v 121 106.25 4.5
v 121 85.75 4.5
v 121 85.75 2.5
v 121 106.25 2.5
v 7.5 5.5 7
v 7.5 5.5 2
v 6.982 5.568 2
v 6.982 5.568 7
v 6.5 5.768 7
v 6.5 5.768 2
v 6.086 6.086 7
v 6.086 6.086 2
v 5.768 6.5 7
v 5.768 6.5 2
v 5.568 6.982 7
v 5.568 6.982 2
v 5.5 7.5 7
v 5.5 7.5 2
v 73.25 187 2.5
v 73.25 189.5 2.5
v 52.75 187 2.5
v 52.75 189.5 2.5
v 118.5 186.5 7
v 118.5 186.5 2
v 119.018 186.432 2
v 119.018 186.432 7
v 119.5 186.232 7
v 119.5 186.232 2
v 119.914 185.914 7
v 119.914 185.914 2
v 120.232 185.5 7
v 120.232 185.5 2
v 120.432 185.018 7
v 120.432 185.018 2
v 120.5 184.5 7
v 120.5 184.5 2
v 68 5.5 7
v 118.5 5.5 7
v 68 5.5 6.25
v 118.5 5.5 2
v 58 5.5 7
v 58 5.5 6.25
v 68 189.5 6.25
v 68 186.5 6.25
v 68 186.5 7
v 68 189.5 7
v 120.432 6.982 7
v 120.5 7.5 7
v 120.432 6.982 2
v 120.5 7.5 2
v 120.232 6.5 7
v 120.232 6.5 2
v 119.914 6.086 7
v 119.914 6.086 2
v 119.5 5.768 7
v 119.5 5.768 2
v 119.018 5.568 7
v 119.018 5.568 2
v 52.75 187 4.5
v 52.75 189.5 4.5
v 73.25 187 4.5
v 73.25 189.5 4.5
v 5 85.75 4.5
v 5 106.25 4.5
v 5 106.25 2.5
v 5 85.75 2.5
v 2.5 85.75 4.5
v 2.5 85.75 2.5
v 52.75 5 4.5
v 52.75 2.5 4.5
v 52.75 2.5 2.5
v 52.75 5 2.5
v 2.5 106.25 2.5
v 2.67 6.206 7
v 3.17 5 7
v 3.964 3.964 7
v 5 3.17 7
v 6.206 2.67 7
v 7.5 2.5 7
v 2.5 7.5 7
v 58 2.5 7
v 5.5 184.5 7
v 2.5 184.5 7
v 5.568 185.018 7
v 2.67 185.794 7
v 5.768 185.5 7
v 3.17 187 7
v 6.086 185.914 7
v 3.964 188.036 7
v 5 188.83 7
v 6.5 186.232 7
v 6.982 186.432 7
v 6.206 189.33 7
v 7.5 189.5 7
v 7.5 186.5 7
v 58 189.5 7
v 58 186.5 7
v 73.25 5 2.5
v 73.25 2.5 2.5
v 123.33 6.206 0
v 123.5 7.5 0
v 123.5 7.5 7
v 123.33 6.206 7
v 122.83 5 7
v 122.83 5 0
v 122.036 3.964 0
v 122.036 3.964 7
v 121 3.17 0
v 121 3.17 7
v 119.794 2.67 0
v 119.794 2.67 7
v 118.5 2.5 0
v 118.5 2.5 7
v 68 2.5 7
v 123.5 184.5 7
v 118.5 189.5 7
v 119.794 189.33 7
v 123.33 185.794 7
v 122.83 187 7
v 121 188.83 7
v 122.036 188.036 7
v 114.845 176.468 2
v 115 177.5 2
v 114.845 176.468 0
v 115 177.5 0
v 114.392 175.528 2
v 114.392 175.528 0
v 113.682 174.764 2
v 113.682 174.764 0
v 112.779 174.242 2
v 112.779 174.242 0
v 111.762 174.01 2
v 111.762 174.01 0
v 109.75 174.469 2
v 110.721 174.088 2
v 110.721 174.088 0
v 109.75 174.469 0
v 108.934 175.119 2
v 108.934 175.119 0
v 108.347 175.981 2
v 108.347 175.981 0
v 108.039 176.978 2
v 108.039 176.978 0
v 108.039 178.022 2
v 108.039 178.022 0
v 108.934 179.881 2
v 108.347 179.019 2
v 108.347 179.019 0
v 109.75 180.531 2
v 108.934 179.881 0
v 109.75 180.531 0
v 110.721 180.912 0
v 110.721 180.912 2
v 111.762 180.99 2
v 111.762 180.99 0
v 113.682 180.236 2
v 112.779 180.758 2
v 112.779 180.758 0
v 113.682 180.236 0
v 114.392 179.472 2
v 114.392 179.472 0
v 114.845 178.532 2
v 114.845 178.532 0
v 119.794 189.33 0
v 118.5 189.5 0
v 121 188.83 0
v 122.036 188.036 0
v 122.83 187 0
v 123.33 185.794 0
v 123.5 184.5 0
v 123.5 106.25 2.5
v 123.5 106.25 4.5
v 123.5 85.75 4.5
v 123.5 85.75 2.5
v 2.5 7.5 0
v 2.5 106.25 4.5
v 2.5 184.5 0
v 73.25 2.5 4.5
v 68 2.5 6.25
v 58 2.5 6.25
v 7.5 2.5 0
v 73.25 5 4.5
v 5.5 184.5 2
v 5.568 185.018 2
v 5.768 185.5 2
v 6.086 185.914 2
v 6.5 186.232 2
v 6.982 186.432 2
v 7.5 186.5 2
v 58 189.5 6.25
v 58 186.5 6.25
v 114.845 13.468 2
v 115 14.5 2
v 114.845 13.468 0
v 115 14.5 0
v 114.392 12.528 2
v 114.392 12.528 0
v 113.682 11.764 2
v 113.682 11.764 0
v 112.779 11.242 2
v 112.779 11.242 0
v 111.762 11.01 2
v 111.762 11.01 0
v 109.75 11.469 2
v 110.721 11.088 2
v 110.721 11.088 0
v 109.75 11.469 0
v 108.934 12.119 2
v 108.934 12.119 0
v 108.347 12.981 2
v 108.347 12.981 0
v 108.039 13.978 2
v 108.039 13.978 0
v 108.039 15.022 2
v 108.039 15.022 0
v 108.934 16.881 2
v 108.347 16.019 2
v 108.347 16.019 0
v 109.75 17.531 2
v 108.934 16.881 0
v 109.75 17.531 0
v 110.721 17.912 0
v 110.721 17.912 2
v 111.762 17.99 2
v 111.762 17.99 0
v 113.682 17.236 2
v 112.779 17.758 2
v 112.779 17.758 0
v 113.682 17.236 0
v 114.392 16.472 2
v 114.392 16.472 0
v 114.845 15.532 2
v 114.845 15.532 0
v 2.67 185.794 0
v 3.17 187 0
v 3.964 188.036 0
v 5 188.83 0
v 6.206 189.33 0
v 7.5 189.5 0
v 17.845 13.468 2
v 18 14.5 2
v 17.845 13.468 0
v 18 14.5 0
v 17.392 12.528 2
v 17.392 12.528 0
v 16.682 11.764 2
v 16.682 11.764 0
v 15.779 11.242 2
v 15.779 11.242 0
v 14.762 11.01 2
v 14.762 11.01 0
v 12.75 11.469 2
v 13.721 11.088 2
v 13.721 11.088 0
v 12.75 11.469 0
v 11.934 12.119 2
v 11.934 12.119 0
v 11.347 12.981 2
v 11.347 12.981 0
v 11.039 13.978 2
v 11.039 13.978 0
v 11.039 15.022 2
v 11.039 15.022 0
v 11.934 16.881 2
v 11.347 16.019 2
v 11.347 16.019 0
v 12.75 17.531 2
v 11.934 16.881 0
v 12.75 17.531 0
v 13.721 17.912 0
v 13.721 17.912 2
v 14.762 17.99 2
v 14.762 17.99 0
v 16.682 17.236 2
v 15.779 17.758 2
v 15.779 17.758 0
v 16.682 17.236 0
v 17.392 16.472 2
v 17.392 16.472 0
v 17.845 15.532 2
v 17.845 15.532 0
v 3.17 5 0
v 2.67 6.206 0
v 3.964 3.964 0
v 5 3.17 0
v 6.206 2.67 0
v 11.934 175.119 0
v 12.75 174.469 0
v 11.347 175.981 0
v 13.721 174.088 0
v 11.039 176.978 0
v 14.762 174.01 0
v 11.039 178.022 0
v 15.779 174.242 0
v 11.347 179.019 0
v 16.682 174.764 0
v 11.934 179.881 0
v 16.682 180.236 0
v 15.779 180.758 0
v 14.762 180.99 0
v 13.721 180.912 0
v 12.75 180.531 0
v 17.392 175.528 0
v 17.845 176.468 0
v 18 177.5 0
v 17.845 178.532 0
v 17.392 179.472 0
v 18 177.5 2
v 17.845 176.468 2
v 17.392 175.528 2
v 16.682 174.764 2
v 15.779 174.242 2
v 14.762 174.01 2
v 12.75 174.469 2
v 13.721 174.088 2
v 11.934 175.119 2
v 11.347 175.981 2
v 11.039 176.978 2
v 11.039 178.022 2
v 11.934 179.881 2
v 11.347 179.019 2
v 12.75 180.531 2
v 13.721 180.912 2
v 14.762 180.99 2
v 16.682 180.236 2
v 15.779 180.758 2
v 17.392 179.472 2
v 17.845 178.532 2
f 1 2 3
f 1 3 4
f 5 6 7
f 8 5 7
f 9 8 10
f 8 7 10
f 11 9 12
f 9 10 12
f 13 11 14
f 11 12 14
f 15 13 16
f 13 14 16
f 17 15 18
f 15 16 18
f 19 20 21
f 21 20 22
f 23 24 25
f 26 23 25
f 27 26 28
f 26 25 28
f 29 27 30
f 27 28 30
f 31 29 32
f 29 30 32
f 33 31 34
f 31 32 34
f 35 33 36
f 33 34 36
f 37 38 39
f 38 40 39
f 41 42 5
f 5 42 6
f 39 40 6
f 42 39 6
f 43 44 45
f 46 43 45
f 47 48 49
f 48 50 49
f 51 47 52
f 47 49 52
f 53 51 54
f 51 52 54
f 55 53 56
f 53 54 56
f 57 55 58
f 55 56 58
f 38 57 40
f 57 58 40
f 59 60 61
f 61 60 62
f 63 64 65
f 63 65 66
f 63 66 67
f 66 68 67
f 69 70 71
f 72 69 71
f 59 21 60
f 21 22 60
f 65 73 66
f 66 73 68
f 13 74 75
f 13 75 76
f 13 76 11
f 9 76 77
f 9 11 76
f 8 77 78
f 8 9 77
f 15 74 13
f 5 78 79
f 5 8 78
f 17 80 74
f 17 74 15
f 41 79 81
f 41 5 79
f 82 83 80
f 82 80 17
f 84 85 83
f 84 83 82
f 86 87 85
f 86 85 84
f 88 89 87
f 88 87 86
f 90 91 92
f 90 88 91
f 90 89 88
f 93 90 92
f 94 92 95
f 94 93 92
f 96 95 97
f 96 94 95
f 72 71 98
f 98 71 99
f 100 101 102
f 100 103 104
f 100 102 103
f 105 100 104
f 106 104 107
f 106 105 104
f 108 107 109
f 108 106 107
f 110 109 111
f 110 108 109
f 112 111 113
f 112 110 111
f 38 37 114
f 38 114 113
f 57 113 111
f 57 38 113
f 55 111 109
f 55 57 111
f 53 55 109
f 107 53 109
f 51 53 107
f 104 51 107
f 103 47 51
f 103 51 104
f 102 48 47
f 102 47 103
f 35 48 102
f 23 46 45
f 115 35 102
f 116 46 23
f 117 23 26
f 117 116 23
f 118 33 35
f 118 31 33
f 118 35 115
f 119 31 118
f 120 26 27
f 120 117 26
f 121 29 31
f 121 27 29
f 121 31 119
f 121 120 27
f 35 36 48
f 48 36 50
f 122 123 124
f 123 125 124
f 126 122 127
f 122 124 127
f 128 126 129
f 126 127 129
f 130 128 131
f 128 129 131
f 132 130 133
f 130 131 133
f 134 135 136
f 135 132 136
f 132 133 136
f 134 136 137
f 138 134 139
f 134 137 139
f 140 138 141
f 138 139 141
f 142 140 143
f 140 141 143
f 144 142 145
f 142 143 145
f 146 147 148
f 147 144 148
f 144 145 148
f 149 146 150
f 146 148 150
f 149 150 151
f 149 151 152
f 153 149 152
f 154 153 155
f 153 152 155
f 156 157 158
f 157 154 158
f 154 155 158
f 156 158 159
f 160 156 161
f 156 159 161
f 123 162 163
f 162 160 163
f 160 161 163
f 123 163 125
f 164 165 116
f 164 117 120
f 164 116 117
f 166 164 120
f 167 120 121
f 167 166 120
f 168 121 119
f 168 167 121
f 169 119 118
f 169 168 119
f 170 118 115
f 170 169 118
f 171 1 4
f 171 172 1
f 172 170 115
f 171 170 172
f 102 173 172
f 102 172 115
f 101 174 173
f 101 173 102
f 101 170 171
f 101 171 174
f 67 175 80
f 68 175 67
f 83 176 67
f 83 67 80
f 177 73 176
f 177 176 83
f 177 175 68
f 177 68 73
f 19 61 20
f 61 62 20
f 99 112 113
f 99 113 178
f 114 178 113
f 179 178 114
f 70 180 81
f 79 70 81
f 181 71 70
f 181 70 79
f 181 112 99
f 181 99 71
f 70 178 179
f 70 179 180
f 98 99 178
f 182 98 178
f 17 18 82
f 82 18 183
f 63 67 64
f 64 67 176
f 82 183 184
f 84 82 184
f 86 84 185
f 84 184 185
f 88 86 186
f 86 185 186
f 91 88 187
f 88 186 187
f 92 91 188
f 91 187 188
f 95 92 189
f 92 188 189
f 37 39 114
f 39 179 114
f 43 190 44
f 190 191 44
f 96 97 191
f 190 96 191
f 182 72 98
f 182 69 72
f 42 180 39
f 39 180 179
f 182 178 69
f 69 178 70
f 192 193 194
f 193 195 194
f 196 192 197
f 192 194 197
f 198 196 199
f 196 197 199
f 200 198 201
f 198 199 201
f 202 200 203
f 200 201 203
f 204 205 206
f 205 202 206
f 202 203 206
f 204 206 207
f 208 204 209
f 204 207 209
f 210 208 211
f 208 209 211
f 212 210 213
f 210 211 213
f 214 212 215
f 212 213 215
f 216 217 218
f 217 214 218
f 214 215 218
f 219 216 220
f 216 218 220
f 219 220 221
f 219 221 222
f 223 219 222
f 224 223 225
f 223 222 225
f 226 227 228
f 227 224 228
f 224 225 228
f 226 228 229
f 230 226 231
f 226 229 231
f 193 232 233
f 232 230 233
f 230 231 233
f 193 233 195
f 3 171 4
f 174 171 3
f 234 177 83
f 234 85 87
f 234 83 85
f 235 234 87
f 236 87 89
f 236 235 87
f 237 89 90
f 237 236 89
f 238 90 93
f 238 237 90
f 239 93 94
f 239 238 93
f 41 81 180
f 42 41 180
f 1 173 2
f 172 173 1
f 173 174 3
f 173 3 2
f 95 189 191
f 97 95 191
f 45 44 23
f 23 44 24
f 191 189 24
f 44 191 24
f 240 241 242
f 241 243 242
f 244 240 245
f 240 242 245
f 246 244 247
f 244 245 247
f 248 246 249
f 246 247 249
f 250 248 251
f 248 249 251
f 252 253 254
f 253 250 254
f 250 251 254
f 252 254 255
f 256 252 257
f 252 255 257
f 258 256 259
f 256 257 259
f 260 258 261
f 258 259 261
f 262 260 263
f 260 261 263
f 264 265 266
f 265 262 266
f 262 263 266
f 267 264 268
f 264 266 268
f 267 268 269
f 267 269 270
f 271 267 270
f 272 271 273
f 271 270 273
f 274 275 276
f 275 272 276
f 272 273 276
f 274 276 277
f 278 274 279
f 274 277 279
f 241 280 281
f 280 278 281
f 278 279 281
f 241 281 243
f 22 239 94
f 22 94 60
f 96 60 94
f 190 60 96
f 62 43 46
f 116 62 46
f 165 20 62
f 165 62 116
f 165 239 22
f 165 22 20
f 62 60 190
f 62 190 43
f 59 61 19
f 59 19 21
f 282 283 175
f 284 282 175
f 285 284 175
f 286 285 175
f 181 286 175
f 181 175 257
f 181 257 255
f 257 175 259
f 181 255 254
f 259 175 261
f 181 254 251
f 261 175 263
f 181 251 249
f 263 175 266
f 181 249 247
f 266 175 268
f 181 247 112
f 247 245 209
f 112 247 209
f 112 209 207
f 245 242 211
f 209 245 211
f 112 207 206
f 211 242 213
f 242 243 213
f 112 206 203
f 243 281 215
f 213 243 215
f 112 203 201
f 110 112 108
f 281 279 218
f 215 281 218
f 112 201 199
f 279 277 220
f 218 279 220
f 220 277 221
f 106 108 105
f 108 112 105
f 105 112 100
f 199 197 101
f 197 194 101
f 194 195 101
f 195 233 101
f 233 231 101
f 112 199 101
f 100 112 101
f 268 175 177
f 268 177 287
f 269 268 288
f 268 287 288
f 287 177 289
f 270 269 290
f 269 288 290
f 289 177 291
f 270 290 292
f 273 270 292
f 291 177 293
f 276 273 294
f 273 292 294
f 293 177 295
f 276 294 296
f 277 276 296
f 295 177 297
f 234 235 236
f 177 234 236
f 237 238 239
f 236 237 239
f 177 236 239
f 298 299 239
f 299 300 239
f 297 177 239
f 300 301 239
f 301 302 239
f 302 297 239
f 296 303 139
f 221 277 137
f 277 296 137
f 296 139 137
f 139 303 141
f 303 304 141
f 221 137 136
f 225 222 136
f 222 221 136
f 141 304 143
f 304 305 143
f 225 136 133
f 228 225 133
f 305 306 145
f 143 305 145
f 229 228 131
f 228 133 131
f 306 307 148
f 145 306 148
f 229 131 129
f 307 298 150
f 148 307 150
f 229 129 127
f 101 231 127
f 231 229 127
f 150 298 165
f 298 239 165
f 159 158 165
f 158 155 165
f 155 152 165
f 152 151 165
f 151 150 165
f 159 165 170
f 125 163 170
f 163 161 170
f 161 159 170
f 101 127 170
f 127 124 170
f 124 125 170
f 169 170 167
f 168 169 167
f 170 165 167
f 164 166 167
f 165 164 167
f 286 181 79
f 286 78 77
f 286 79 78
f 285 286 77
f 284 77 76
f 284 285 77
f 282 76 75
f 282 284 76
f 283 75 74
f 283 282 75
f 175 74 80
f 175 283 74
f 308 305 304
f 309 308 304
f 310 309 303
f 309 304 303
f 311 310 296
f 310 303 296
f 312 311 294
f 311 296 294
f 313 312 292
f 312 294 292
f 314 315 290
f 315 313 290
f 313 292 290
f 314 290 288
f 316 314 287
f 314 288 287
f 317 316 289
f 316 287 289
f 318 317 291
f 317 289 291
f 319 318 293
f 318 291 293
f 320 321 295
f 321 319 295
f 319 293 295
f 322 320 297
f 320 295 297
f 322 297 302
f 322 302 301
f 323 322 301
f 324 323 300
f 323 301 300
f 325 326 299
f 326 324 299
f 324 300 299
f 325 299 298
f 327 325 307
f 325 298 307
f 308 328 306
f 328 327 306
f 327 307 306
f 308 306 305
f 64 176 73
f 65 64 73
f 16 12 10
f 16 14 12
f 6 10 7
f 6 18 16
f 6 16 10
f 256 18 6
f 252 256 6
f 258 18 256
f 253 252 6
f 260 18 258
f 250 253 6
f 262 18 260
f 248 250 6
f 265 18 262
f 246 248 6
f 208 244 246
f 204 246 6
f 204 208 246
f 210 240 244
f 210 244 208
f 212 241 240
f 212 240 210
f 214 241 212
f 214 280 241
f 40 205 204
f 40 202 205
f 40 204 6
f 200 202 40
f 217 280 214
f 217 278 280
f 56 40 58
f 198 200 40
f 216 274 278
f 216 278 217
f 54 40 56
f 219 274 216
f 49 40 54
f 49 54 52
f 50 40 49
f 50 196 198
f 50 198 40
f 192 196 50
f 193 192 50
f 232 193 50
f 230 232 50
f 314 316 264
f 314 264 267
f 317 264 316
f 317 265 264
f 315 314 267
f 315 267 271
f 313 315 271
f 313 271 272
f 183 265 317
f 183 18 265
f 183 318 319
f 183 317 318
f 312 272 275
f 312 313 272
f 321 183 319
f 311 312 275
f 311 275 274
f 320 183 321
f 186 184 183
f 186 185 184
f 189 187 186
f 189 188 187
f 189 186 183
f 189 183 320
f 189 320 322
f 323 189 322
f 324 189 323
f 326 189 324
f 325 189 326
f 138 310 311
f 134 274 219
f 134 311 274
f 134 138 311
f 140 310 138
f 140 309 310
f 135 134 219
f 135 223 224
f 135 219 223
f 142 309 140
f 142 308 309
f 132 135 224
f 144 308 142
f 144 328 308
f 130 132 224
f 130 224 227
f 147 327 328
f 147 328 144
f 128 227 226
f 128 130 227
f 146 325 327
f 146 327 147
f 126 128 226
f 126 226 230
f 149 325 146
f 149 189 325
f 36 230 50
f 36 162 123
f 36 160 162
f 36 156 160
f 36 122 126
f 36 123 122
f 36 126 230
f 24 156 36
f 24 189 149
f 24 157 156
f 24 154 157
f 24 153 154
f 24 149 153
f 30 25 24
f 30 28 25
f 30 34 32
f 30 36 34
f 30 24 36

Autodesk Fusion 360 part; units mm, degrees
sketch "Sketch1" plane through (0, 0, 0) normal (0, 0, 1) x (1, 0, 0)
  circle A0 centre (14.5, 177.5) radius 3.5
  line L0 (7.5, 189.5) -> (118.5, 189.5)
  line L1 (123.5, 184.5) -> (123.5, 7.5)
  line L2 (118.5, 2.5) -> (7.5, 2.5)
  line L3 (2.5, 7.5) -> (2.5, 184.5)
  arc A1 (7.5, 189.5) -> (2.5, 184.5) centre (7.5, 184.5) ccw
  arc A2 (123.5, 184.5) -> (118.5, 189.5) centre (118.5, 184.5) ccw
  arc A3 (2.5, 7.5) -> (7.5, 2.5) centre (7.5, 7.5) ccw
  arc A4 (118.5, 2.5) -> (123.5, 7.5) centre (118.5, 7.5) ccw
  arc A5 (118.5, 5.5) -> (120.5, 7.5) centre (118.5, 7.5) ccw
  line L4 (120.5, 184.5) -> (120.5, 7.5)
  arc A6 (120.5, 184.5) -> (118.5, 186.5) centre (118.5, 184.5) ccw
  line L5 (7.5, 186.5) -> (118.5, 186.5)
  arc A7 (7.5, 186.5) -> (5.5, 184.5) centre (7.5, 184.5) ccw
  line L6 (5.5, 7.5) -> (5.5, 184.5)
  arc A8 (5.5, 7.5) -> (7.5, 5.5) centre (7.5, 7.5) ccw
  line L7 (118.5, 5.5) -> (7.5, 5.5)
  line L8 (63, 186.5) -> (63, 5.5)
  line L9 (5.5, 96) -> (120.5, 96)
  circle A9 centre (111.5, 177.5) radius 3.5
  circle A10 centre (14.5, 14.5) radius 3.5
  circle A11 centre (111.5, 14.5) radius 3.5
  dimension "d5" = 7
  dimension "d28" = 5
  dimension "d30" = 5
  dimension "d32" = 5
  dimension "d34" = 5
  dimension "d36" = 3
  dimension "d37" = 187
  dimension "d38" = 121
  dimension "d41" = 9
  dimension "d42" = 9
extrude "Extrude5" add sketch "Sketch1" along normal blind 2 contours L0 L1 L2 L3 A1 A2 A3 A4 | A5 L4 L7 L8 L9 | L6 A8 L7 L8 L9 | L4 A6 L5 L8 L9 | L5 A7 L6 L8 L9
extrude "Extrude6" add sketch "Sketch1" along normal blind 7 contours L0 L1 L2 L3 A1 A2 A3 A4
sketch "Skizze3" plane through (2.5, 0, 0) normal (-1, 0, 0) x (0, -1, 0)
  line L0 (-184.5, 0) -> (-7.5, 0)
  line L1 (-7.5, 0) -> (-7.5, 7)
  line L2 (-7.5, 7) -> (-184.5, 7)
  line L3 (-184.5, 7) -> (-184.5, 0)
  line L4 (-184.5, 7) -> (-7.5, 0)
  line L5 (-7.5, 7) -> (-184.5, 0)
  line L6 (-85.75, 4.5) -> (-106.25, 4.5)
  line L7 (-106.25, 4.5) -> (-106.25, 2.5)
  line L8 (-106.25, 2.5) -> (-85.75, 2.5)
  line L9 (-85.75, 2.5) -> (-85.75, 4.5)
  line L10 (-85.75, 4.5) -> (-106.25, 2.5) construction
  line L11 (-106.25, 4.5) -> (-85.75, 2.5) construction
  point P0 (-96, 3.5)
  dimension "d43" = 20.5
  dimension "d44" = 2
extrude "Extrusion7" cut sketch "Skizze3" against normal blind 2.5 contours L4 L5 L7 | L4 L5 L7 L8 L9 | L4 L5 L9 | L4 L5 L6 L7 L9
sketch "Skizze4" plane through (0, 189.5, 0) normal (0, 1, 0) x (-1, 0, 0)
  line L0 (-118.5, 0) -> (-7.5, 0)
  line L1 (-7.5, 0) -> (-7.5, 7)
  line L2 (-7.5, 7) -> (-118.5, 7)
  line L3 (-118.5, 7) -> (-118.5, 0)
  line L4 (-118.5, 7) -> (-7.5, 0)
  line L5 (-7.5, 7) -> (-118.5, 0)
  line L6 (-52.75, 4.5) -> (-73.25, 4.5)
  line L7 (-73.25, 4.5) -> (-73.25, 2.5)
  line L8 (-73.25, 2.5) -> (-52.75, 2.5)
  line L9 (-52.75, 2.5) -> (-52.75, 4.5)
  line L10 (-52.75, 4.5) -> (-73.25, 2.5) construction
  line L11 (-73.25, 4.5) -> (-52.75, 2.5) construction
  point P0 (-63, 3.5)
  dimension "d47" = 20.5
  dimension "d48" = 2
extrude "Extrusion8" cut sketch "Skizze4" against normal blind 2.5 contours L4 L5 L7 | L4 L5 L7 L8 L9 | L4 L5 L9 | L4 L5 L6 L7 L9
sketch "Skizze5" plane through (0, 2.5, 0) normal (0, -1, 0) x (1, 0, 0)
  line L0 (7.5, 0) -> (118.5, 0)
  line L1 (118.5, 0) -> (118.5, 7)
  line L2 (118.5, 7) -> (7.5, 7)
  line L3 (7.5, 7) -> (7.5, 0)
  line L4 (118.5, 7) -> (7.5, 0)
  line L5 (7.5, 7) -> (118.5, 0)
  line L6 (73.25, 4.5) -> (52.75, 4.5)
  line L7 (52.75, 4.5) -> (52.75, 2.5)
  line L8 (52.75, 2.5) -> (73.25, 2.5)
  line L9 (73.25, 2.5) -> (73.25, 4.5)
  line L10 (73.25, 4.5) -> (52.75, 2.5) construction
  line L11 (52.75, 4.5) -> (73.25, 2.5) construction
  point P0 (63, 3.5)
  dimension "d51" = 20.5
  dimension "d52" = 2
extrude "Extrusion9" cut sketch "Skizze5" against normal blind 2.5 contours L4 L5 L7 | L4 L5 L7 L8 L9 | L4 L5 L9 | L4 L5 L6 L7 L9
sketch "Skizze6" plane through (123.5, 0, 0) normal (1, 0, 0) x (0, 1, 0)
  line L0 (7.5, 0) -> (184.5, 0)
  line L1 (184.5, 0) -> (184.5, 7)
  line L2 (184.5, 7) -> (7.5, 7)
  line L3 (7.5, 7) -> (7.5, 0)
  line L4 (7.5, 7) -> (184.5, 0)
  line L5 (184.5, 7) -> (7.5, 0)
  line L6 (106.25, 2.5) -> (85.75, 2.5)
  line L7 (85.75, 2.5) -> (85.75, 4.5)
  line L8 (85.75, 4.5) -> (106.25, 4.5)
  line L9 (106.25, 4.5) -> (106.25, 2.5)
  line L10 (106.25, 2.5) -> (85.75, 4.5) construction
  line L11 (85.75, 2.5) -> (106.25, 4.5) construction
  point P0 (96, 3.5)
  point P1 (96, 3.5)
  dimension "d55" = 20.5
  dimension "d56" = 2
  dimension "d59" = 3.5
extrude "Extrusion10" cut sketch "Skizze6" against normal blind 2.5 contours L4 L5 L7 | L4 L5 L6 L7 L9 | L4 L5 L9 | L4 L5 L7 L8 L9
sketch "Cutout USB" plane through (0, 2.5, 0) normal (0, -1, 0) x (1, 0, 0)
  line L0 (52.75, 4.5) -> (73.25, 4.5)
  line L1 (73.25, 4.5) -> (73.25, 2.5)
  line L2 (73.25, 2.5) -> (52.75, 2.5)
  line L3 (52.75, 2.5) -> (52.75, 4.5)
  line L4 (7.5, 0) -> (118.5, 0)
  line L5 (118.5, 0) -> (118.5, 7)
  line L6 (118.5, 7) -> (7.5, 7)
  line L7 (7.5, 7) -> (7.5, 0)
  line L8 (58, 6.25) -> (68, 6.25)
  line L9 (68, 6.25) -> (68, 7)
  line L10 (68, 7) -> (58, 7)
  line L11 (58, 7) -> (58, 6.25)
  dimension "d64" = 10
  dimension "d65" = 0.75
extrude "Extrude11" cut sketch "Cutout USB" against normal blind 190 contours L6 L8 L9 L10 L11
